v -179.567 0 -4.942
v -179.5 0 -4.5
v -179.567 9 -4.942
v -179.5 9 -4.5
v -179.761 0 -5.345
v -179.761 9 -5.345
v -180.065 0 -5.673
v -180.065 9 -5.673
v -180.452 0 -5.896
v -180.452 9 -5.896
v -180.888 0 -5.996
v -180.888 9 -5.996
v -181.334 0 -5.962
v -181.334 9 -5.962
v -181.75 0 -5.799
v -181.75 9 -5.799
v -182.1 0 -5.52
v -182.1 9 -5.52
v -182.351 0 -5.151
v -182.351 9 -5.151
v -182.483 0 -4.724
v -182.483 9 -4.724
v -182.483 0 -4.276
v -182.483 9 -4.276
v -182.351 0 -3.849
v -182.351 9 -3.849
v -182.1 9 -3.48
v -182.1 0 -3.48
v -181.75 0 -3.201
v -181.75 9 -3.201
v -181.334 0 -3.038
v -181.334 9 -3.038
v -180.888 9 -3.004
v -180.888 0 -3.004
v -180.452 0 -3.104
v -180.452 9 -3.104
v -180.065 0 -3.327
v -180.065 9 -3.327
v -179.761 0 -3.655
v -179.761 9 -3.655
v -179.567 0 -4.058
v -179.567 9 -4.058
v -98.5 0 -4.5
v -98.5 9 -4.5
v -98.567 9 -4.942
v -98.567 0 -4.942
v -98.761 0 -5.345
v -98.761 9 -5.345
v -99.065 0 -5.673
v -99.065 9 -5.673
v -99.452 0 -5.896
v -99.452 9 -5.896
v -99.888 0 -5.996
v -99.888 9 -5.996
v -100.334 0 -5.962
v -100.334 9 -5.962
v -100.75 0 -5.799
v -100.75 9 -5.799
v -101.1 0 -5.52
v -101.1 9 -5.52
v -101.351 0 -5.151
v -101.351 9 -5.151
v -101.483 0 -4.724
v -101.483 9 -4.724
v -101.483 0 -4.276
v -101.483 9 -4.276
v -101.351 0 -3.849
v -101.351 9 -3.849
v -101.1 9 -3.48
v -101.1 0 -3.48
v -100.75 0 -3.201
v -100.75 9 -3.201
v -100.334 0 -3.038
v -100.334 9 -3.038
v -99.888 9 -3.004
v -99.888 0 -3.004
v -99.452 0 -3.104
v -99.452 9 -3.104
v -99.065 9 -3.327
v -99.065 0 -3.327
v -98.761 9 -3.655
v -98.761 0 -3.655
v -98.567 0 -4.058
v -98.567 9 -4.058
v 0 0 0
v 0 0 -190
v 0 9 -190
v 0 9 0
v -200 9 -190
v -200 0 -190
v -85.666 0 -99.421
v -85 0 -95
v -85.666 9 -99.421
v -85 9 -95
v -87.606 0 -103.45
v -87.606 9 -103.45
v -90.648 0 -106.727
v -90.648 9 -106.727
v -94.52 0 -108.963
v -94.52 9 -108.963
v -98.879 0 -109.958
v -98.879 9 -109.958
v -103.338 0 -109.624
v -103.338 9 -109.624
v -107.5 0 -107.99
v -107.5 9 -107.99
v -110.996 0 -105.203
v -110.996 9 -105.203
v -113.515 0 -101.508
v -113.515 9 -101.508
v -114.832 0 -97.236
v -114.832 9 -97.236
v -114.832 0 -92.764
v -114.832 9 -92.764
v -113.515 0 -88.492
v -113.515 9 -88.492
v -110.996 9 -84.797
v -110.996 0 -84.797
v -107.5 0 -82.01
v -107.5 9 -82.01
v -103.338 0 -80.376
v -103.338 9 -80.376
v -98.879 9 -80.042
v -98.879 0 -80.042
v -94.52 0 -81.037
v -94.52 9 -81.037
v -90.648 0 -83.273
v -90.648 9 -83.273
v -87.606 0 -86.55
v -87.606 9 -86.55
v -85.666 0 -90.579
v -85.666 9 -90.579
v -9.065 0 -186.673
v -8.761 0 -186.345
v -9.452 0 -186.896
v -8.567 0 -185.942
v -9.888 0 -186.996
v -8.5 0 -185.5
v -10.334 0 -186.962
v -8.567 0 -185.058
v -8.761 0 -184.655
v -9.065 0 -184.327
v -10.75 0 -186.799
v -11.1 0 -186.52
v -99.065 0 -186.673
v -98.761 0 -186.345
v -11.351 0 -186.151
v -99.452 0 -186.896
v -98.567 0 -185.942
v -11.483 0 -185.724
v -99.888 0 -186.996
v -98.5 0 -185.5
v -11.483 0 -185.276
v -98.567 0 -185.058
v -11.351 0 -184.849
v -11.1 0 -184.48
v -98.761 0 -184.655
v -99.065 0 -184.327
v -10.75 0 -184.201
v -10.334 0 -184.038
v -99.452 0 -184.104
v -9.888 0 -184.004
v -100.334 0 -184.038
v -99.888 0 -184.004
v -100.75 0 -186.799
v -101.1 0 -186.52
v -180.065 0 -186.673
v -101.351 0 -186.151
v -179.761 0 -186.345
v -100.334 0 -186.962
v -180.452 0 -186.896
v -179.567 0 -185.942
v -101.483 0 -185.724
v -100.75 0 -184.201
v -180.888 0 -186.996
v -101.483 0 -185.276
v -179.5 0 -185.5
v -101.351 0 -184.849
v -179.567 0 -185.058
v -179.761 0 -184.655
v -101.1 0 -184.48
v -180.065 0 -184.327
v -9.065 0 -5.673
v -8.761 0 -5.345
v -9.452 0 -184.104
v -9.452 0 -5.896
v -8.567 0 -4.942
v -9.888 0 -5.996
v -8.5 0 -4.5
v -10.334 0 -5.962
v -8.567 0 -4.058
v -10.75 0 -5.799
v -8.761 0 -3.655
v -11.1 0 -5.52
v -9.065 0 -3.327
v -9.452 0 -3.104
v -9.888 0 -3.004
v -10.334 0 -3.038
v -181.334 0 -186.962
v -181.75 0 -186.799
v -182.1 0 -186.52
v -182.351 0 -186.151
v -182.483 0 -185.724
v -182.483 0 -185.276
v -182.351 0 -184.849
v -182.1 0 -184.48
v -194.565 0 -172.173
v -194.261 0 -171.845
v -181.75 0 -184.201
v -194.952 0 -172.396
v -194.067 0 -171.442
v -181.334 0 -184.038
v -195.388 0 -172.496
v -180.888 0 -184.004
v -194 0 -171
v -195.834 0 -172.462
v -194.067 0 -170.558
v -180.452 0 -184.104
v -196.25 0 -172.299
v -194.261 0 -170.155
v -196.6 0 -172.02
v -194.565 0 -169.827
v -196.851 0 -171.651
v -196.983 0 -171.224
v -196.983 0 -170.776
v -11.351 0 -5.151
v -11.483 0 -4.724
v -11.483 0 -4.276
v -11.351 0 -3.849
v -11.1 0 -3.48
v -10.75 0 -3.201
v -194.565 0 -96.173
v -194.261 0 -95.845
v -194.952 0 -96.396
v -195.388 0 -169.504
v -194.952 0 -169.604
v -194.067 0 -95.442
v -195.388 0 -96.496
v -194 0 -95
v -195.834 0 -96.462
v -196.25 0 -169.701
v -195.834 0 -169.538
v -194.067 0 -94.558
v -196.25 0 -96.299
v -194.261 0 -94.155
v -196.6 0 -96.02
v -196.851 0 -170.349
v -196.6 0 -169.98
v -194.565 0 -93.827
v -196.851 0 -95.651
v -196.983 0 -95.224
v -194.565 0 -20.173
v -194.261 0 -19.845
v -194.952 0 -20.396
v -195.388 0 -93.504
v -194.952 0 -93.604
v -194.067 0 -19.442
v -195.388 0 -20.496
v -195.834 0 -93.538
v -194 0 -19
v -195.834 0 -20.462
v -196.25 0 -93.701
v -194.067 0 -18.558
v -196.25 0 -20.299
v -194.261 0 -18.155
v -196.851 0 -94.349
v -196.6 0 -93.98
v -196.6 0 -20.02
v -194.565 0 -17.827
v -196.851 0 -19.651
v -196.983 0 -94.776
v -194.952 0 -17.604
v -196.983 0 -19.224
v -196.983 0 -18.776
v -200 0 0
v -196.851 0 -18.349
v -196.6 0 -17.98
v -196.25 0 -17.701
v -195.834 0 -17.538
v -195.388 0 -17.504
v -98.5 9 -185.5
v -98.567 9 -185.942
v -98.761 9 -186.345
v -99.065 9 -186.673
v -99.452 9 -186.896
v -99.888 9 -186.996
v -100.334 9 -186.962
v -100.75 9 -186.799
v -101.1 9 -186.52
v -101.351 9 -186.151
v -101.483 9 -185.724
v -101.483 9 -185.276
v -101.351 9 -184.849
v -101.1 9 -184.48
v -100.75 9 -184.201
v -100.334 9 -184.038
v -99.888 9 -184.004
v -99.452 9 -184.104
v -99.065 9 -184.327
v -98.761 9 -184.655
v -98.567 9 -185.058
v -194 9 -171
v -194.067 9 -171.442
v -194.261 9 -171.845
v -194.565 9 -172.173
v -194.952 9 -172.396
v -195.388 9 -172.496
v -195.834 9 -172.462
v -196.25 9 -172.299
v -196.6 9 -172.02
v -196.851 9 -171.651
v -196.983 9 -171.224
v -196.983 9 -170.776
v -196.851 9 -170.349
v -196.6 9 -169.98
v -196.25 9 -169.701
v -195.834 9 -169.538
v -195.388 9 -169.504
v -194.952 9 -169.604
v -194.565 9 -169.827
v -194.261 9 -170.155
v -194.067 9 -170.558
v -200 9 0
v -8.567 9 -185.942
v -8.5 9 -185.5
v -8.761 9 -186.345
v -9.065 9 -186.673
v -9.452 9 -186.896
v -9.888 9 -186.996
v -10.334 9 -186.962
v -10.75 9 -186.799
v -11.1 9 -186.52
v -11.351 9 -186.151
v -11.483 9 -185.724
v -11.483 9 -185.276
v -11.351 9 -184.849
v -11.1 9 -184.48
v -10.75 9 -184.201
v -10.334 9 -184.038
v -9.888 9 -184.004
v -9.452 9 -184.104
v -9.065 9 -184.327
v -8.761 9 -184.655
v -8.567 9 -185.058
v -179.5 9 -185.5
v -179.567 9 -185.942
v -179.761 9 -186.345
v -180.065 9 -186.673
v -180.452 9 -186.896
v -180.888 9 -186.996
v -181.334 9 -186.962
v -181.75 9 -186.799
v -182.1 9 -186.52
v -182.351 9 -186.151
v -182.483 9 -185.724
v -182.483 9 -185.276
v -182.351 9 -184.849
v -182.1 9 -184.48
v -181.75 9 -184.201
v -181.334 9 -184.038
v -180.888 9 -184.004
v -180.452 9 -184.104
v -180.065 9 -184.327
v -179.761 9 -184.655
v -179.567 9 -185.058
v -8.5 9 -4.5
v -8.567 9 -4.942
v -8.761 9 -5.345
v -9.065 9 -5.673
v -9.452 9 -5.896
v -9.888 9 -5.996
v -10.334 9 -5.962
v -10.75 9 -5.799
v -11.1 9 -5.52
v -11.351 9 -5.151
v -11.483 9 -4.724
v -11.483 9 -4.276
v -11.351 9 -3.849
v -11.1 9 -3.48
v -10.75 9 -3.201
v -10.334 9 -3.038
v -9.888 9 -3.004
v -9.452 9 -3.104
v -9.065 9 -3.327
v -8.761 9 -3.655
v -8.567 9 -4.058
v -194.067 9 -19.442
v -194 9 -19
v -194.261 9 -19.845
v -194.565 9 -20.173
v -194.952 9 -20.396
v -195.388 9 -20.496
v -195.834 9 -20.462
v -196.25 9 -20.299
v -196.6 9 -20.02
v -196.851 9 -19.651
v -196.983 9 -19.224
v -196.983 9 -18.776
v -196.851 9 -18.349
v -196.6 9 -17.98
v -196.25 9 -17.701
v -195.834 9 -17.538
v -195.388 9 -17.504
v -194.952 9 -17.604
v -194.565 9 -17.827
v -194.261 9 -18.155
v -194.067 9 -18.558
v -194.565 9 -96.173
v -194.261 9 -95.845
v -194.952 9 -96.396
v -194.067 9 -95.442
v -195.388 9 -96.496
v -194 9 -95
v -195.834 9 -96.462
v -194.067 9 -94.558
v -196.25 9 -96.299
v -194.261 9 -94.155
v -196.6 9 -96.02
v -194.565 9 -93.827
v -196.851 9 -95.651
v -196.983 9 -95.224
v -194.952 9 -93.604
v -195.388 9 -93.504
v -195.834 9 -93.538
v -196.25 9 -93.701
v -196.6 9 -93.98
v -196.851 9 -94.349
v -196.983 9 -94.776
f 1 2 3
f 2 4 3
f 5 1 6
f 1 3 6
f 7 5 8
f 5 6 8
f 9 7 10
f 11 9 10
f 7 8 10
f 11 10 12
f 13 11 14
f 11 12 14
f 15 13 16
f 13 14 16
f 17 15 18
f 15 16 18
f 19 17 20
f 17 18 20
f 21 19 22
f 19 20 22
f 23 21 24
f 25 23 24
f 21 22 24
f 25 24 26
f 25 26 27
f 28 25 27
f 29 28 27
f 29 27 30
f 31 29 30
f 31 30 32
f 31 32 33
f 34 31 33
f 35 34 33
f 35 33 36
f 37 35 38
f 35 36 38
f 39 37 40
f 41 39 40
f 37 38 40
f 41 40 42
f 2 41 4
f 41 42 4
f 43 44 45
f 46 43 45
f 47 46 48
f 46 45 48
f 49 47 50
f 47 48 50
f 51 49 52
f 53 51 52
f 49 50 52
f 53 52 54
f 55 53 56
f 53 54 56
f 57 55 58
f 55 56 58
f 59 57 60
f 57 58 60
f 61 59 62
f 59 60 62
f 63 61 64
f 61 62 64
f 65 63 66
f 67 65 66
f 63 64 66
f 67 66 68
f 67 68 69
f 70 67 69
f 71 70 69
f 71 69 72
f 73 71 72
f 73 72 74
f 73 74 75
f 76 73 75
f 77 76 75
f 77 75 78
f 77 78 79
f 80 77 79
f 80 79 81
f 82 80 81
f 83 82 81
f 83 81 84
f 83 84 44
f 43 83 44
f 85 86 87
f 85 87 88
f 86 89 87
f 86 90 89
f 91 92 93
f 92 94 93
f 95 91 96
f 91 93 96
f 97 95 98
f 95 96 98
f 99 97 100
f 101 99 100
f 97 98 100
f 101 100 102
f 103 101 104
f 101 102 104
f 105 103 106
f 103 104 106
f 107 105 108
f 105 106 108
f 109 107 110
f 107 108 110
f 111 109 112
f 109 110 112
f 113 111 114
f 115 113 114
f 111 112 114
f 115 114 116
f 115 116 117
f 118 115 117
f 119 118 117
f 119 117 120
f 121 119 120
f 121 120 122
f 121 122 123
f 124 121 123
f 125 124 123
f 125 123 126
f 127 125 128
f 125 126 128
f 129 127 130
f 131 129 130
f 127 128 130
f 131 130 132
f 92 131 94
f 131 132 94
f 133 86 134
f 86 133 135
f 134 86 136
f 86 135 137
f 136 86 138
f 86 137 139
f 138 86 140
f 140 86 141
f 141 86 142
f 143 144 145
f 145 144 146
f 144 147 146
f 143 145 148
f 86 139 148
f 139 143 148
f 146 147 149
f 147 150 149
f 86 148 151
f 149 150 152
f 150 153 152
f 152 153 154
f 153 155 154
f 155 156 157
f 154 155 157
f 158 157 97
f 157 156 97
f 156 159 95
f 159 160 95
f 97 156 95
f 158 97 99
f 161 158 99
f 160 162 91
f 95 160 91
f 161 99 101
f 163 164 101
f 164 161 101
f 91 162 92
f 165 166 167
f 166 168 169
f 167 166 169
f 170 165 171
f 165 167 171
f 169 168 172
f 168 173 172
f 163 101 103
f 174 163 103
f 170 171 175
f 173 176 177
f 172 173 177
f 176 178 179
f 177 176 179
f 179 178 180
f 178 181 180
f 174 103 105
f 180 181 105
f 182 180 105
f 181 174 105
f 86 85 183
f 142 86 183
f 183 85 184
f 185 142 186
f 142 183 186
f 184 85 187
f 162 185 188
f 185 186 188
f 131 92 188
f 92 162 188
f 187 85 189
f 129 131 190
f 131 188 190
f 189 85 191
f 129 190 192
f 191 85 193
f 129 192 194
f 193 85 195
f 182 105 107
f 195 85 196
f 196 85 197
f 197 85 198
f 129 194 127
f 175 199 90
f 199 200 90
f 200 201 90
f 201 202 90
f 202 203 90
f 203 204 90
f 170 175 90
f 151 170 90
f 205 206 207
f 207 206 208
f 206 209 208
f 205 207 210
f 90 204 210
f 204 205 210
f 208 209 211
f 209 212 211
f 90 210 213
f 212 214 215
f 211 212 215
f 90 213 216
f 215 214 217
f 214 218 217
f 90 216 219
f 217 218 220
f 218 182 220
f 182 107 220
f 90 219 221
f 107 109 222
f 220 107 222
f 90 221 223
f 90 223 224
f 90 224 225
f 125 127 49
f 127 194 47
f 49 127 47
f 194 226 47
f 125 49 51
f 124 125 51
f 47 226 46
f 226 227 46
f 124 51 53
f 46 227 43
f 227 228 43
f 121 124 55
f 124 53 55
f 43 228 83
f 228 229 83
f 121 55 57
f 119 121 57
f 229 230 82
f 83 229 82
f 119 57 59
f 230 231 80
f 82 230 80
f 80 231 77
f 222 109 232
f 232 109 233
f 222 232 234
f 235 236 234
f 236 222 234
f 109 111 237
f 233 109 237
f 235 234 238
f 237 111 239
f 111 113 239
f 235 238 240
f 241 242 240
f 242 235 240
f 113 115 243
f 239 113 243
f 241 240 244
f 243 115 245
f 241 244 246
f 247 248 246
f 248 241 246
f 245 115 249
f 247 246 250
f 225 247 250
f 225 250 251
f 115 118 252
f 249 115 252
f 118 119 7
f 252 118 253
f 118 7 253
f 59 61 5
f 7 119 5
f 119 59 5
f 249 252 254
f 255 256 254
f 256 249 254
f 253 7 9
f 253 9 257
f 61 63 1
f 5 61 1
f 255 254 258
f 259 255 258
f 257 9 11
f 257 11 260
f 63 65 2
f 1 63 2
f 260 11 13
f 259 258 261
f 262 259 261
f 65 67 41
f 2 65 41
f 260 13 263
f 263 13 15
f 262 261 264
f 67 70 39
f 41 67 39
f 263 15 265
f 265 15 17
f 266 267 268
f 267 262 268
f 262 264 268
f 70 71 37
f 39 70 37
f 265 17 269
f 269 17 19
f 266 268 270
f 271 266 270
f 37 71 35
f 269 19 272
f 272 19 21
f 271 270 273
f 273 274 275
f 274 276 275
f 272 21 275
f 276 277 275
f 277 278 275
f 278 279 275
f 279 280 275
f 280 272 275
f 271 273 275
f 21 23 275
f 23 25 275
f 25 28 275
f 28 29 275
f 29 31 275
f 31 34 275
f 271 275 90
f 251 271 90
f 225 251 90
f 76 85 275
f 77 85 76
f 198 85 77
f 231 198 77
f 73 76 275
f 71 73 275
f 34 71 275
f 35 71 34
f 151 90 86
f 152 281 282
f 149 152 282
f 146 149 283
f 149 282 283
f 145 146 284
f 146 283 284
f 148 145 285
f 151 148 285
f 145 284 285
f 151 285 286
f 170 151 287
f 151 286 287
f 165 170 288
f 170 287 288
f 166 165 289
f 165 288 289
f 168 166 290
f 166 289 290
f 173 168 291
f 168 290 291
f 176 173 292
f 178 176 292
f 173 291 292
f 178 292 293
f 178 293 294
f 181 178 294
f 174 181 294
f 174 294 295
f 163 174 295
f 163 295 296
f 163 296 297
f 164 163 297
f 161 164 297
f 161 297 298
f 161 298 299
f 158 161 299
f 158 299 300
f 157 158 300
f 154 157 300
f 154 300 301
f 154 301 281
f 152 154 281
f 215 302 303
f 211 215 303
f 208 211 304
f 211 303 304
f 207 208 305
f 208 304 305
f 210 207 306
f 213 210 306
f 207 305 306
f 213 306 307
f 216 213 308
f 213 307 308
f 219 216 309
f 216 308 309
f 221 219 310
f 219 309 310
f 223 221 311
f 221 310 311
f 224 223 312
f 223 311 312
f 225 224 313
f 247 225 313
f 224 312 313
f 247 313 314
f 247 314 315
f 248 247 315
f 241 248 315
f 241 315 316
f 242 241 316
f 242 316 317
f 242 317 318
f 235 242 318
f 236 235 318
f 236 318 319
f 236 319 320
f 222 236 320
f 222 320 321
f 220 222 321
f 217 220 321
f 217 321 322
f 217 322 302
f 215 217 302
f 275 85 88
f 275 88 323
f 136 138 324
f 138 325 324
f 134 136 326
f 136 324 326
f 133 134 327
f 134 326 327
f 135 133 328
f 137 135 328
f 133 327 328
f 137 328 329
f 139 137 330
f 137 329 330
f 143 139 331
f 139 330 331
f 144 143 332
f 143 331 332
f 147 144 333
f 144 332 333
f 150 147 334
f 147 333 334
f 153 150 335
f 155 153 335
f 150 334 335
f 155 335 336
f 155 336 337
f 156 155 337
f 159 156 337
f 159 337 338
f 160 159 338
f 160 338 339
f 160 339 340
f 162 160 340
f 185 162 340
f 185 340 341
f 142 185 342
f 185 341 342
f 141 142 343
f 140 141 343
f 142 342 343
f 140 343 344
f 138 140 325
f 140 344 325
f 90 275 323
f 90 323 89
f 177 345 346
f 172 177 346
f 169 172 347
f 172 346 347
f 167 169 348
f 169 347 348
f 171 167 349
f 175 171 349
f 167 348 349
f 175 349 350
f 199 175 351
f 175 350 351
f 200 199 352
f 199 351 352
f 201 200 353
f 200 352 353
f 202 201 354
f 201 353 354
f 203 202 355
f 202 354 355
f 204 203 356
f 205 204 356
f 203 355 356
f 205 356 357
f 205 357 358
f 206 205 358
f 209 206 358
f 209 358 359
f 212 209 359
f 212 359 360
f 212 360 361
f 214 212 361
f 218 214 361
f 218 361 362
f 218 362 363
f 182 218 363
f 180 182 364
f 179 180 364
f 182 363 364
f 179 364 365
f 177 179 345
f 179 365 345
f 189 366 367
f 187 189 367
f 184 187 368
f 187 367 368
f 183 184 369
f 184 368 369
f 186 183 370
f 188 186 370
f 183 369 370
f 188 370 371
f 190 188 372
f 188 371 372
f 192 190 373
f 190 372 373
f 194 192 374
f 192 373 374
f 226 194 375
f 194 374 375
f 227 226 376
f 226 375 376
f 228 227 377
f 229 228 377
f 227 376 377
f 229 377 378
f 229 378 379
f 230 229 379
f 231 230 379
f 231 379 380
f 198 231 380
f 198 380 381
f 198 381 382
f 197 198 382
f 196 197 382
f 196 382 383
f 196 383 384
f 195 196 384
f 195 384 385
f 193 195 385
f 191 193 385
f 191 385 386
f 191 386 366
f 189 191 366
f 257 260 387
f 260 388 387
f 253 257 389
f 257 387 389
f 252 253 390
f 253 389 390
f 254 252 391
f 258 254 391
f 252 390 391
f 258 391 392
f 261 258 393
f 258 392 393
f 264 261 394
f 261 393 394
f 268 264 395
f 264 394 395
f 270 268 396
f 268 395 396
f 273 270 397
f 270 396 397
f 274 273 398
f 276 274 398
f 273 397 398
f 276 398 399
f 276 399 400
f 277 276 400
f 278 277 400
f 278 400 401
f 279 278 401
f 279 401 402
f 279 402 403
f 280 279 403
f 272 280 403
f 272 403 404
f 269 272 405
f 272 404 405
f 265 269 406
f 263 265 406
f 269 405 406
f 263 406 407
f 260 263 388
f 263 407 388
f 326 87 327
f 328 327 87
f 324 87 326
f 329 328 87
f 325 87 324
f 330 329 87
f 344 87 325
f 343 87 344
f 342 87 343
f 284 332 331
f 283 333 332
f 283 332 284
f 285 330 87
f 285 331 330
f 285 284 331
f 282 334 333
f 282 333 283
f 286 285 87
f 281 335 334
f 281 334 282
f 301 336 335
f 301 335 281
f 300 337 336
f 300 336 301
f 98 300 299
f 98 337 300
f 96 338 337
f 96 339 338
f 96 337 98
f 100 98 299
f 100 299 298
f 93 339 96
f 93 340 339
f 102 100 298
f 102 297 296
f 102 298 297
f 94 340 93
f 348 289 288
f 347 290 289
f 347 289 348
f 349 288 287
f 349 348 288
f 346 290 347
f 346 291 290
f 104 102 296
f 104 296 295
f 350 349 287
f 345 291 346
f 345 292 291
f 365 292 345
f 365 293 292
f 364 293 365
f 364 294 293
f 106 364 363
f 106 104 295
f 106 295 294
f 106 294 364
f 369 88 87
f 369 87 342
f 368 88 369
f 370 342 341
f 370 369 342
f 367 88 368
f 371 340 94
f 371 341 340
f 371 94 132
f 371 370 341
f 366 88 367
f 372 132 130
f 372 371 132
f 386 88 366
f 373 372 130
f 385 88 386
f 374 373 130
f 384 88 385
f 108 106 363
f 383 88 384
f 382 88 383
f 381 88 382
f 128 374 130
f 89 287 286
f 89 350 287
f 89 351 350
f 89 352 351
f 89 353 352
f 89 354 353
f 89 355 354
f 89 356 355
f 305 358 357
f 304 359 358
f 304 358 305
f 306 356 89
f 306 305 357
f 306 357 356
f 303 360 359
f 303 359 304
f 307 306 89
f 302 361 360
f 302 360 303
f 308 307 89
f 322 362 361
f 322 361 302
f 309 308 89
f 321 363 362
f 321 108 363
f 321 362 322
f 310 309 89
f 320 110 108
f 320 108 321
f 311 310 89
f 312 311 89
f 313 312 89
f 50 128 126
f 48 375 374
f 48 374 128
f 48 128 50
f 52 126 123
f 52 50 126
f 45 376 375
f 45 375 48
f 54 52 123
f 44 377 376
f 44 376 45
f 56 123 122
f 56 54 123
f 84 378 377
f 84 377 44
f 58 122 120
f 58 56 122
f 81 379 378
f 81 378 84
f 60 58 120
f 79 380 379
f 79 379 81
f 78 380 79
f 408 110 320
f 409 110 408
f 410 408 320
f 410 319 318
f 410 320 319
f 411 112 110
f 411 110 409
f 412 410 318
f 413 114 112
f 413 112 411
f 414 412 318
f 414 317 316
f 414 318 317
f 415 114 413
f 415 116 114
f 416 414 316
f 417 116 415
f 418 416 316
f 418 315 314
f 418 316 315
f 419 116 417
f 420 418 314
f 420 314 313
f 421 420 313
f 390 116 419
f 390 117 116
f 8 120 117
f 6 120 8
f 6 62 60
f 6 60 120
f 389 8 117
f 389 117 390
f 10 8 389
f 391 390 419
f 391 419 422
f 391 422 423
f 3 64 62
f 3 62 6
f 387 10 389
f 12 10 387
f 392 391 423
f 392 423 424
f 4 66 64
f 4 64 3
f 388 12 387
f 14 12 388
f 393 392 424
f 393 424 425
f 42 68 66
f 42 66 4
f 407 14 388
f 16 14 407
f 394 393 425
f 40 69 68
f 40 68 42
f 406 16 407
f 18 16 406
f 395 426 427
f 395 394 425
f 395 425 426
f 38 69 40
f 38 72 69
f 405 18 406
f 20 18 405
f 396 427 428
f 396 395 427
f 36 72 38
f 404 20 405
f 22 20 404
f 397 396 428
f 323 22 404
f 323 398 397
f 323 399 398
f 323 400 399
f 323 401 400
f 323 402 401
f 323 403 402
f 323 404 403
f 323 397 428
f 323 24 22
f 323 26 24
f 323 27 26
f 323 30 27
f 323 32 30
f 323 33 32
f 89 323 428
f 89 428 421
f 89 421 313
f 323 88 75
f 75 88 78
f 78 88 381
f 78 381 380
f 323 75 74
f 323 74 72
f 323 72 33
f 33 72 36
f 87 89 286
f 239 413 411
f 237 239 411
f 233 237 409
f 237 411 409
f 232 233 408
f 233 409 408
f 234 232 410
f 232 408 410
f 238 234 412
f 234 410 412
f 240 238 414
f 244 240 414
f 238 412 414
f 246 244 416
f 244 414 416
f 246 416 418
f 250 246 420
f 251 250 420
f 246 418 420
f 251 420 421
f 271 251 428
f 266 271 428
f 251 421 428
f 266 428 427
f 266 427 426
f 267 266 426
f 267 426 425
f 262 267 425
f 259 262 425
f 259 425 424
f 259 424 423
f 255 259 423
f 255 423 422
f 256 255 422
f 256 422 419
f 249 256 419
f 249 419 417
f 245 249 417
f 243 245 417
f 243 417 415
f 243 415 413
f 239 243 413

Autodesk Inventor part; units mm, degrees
ref_plane "YZ Plane" through (0, 0, 0) normal (1, 0, 0) x (0, 1, 0)
ref_plane "XZ Plane" through (0, 0, 0) normal (0, 1, 0) x (-1, 0, 0)
ref_plane "XY Plane" through (0, 0, 0) normal (0, 0, 1) x (1, 0, 0)
sketch "Sketch1" plane through (0, 0, 0) normal (0, 1, 0) x (-1, 0, 0)
  line L0 (0, 0) -> (200, 0)
  line L1 (200, 0) -> (200, -190)
  line L2 (200, -190) -> (0, -190)
  line L3 (0, -190) -> (0, 0)
  dimension "d0" = 200
  dimension "d1" = 190
extrude "Extrusion1" add sketch "Sketch1" along normal blind 9
sketch "Sketch10" plane through (0, 9, 0) normal (0, 1, 0) x (1, 0, 0)
  line L0 (0, 190) -> (-200, 190) projected
  line L1 (-200, 190) -> (-200, 0) projected
  line L2 (-200, 0) -> (0, 0) projected
  line L3 (0, 0) -> (0, 190) projected
  circle A0 centre (-100, 95) radius 15
  dimension "d27" = 30
extrude "Extrusion10" cut sketch "Sketch10" against normal blind 9 contours A0
sketch "Sketch14" plane through (0, 9, 0) normal (0, 1, 0) x (1, 0, 0)
  circle A0 centre (-100, 95) radius 15 projected
  line L0 (0, 190) -> (-200, 190) projected
  line L1 (-200, 190) -> (-200, 0) projected
  line L2 (-200, 0) -> (0, 0) projected
  line L3 (0, 0) -> (0, 190) projected
  line L4 (-200, 190) -> (-200, 0) projected
  line L5 (-200, 190) -> (0, 190)
  line L6 (0, 190) -> (0, 181)
  line L7 (0, 181) -> (-200, 181)
  line L8 (-200, 181) -> (-200, 190)
  line L9 (-200, 0) -> (0, 0) projected
  line L10 (-200, 181) -> (-191, 181)
  line L11 (-191, 181) -> (-191, 0)
  line L12 (-191, 0) -> (-200, 0)
  line L13 (-200, 0) -> (-200, 181)
  line L14 (0, 0) -> (0, 190) projected
  line L15 (-191, 0) -> (0, 0)
  line L16 (0, 0) -> (0, 9)
  line L17 (0, 9) -> (-191, 9)
  line L18 (-191, 9) -> (-191, 0)
  circle A1 centre (-10, 4.5) radius 1.5
  circle A2 centre (-100, 4.5) radius 1.5
  circle A3 centre (-181, 4.5) radius 1.5
  line L19 (-245.0017, 95) -> (56.9583, 95)
  circle A4 centre (-10, 185.5) radius 1.5
  circle A5 centre (-100, 185.5) radius 1.5
  circle A6 centre (-181, 185.5) radius 1.5
  circle A7 centre (-195.5, 95) radius 1.5
  circle A8 centre (-195.5, 171) radius 1.5
  circle A9 centre (-195.5, 19) radius 1.5
  dimension "d47" = 9
  dimension "d48" = 9
  dimension "d49" = 9
  dimension "d50" = 3
  dimension "d51" = 3
  dimension "d52" = 3
  dimension "d55" = 3
  dimension "d56" = 3
  dimension "d57" = 3
extrude "Extrusion14" cut sketch "Sketch14" against normal blind 10 contours A1 | A2 | A3 | A4 | A5 | A6
extrude "Extrusion15" cut sketch "Sketch14" against normal blind 10 contours A7 L19 | L19 A7 | A8 | A9
properties part number "BaseEncima_3DPrint"
